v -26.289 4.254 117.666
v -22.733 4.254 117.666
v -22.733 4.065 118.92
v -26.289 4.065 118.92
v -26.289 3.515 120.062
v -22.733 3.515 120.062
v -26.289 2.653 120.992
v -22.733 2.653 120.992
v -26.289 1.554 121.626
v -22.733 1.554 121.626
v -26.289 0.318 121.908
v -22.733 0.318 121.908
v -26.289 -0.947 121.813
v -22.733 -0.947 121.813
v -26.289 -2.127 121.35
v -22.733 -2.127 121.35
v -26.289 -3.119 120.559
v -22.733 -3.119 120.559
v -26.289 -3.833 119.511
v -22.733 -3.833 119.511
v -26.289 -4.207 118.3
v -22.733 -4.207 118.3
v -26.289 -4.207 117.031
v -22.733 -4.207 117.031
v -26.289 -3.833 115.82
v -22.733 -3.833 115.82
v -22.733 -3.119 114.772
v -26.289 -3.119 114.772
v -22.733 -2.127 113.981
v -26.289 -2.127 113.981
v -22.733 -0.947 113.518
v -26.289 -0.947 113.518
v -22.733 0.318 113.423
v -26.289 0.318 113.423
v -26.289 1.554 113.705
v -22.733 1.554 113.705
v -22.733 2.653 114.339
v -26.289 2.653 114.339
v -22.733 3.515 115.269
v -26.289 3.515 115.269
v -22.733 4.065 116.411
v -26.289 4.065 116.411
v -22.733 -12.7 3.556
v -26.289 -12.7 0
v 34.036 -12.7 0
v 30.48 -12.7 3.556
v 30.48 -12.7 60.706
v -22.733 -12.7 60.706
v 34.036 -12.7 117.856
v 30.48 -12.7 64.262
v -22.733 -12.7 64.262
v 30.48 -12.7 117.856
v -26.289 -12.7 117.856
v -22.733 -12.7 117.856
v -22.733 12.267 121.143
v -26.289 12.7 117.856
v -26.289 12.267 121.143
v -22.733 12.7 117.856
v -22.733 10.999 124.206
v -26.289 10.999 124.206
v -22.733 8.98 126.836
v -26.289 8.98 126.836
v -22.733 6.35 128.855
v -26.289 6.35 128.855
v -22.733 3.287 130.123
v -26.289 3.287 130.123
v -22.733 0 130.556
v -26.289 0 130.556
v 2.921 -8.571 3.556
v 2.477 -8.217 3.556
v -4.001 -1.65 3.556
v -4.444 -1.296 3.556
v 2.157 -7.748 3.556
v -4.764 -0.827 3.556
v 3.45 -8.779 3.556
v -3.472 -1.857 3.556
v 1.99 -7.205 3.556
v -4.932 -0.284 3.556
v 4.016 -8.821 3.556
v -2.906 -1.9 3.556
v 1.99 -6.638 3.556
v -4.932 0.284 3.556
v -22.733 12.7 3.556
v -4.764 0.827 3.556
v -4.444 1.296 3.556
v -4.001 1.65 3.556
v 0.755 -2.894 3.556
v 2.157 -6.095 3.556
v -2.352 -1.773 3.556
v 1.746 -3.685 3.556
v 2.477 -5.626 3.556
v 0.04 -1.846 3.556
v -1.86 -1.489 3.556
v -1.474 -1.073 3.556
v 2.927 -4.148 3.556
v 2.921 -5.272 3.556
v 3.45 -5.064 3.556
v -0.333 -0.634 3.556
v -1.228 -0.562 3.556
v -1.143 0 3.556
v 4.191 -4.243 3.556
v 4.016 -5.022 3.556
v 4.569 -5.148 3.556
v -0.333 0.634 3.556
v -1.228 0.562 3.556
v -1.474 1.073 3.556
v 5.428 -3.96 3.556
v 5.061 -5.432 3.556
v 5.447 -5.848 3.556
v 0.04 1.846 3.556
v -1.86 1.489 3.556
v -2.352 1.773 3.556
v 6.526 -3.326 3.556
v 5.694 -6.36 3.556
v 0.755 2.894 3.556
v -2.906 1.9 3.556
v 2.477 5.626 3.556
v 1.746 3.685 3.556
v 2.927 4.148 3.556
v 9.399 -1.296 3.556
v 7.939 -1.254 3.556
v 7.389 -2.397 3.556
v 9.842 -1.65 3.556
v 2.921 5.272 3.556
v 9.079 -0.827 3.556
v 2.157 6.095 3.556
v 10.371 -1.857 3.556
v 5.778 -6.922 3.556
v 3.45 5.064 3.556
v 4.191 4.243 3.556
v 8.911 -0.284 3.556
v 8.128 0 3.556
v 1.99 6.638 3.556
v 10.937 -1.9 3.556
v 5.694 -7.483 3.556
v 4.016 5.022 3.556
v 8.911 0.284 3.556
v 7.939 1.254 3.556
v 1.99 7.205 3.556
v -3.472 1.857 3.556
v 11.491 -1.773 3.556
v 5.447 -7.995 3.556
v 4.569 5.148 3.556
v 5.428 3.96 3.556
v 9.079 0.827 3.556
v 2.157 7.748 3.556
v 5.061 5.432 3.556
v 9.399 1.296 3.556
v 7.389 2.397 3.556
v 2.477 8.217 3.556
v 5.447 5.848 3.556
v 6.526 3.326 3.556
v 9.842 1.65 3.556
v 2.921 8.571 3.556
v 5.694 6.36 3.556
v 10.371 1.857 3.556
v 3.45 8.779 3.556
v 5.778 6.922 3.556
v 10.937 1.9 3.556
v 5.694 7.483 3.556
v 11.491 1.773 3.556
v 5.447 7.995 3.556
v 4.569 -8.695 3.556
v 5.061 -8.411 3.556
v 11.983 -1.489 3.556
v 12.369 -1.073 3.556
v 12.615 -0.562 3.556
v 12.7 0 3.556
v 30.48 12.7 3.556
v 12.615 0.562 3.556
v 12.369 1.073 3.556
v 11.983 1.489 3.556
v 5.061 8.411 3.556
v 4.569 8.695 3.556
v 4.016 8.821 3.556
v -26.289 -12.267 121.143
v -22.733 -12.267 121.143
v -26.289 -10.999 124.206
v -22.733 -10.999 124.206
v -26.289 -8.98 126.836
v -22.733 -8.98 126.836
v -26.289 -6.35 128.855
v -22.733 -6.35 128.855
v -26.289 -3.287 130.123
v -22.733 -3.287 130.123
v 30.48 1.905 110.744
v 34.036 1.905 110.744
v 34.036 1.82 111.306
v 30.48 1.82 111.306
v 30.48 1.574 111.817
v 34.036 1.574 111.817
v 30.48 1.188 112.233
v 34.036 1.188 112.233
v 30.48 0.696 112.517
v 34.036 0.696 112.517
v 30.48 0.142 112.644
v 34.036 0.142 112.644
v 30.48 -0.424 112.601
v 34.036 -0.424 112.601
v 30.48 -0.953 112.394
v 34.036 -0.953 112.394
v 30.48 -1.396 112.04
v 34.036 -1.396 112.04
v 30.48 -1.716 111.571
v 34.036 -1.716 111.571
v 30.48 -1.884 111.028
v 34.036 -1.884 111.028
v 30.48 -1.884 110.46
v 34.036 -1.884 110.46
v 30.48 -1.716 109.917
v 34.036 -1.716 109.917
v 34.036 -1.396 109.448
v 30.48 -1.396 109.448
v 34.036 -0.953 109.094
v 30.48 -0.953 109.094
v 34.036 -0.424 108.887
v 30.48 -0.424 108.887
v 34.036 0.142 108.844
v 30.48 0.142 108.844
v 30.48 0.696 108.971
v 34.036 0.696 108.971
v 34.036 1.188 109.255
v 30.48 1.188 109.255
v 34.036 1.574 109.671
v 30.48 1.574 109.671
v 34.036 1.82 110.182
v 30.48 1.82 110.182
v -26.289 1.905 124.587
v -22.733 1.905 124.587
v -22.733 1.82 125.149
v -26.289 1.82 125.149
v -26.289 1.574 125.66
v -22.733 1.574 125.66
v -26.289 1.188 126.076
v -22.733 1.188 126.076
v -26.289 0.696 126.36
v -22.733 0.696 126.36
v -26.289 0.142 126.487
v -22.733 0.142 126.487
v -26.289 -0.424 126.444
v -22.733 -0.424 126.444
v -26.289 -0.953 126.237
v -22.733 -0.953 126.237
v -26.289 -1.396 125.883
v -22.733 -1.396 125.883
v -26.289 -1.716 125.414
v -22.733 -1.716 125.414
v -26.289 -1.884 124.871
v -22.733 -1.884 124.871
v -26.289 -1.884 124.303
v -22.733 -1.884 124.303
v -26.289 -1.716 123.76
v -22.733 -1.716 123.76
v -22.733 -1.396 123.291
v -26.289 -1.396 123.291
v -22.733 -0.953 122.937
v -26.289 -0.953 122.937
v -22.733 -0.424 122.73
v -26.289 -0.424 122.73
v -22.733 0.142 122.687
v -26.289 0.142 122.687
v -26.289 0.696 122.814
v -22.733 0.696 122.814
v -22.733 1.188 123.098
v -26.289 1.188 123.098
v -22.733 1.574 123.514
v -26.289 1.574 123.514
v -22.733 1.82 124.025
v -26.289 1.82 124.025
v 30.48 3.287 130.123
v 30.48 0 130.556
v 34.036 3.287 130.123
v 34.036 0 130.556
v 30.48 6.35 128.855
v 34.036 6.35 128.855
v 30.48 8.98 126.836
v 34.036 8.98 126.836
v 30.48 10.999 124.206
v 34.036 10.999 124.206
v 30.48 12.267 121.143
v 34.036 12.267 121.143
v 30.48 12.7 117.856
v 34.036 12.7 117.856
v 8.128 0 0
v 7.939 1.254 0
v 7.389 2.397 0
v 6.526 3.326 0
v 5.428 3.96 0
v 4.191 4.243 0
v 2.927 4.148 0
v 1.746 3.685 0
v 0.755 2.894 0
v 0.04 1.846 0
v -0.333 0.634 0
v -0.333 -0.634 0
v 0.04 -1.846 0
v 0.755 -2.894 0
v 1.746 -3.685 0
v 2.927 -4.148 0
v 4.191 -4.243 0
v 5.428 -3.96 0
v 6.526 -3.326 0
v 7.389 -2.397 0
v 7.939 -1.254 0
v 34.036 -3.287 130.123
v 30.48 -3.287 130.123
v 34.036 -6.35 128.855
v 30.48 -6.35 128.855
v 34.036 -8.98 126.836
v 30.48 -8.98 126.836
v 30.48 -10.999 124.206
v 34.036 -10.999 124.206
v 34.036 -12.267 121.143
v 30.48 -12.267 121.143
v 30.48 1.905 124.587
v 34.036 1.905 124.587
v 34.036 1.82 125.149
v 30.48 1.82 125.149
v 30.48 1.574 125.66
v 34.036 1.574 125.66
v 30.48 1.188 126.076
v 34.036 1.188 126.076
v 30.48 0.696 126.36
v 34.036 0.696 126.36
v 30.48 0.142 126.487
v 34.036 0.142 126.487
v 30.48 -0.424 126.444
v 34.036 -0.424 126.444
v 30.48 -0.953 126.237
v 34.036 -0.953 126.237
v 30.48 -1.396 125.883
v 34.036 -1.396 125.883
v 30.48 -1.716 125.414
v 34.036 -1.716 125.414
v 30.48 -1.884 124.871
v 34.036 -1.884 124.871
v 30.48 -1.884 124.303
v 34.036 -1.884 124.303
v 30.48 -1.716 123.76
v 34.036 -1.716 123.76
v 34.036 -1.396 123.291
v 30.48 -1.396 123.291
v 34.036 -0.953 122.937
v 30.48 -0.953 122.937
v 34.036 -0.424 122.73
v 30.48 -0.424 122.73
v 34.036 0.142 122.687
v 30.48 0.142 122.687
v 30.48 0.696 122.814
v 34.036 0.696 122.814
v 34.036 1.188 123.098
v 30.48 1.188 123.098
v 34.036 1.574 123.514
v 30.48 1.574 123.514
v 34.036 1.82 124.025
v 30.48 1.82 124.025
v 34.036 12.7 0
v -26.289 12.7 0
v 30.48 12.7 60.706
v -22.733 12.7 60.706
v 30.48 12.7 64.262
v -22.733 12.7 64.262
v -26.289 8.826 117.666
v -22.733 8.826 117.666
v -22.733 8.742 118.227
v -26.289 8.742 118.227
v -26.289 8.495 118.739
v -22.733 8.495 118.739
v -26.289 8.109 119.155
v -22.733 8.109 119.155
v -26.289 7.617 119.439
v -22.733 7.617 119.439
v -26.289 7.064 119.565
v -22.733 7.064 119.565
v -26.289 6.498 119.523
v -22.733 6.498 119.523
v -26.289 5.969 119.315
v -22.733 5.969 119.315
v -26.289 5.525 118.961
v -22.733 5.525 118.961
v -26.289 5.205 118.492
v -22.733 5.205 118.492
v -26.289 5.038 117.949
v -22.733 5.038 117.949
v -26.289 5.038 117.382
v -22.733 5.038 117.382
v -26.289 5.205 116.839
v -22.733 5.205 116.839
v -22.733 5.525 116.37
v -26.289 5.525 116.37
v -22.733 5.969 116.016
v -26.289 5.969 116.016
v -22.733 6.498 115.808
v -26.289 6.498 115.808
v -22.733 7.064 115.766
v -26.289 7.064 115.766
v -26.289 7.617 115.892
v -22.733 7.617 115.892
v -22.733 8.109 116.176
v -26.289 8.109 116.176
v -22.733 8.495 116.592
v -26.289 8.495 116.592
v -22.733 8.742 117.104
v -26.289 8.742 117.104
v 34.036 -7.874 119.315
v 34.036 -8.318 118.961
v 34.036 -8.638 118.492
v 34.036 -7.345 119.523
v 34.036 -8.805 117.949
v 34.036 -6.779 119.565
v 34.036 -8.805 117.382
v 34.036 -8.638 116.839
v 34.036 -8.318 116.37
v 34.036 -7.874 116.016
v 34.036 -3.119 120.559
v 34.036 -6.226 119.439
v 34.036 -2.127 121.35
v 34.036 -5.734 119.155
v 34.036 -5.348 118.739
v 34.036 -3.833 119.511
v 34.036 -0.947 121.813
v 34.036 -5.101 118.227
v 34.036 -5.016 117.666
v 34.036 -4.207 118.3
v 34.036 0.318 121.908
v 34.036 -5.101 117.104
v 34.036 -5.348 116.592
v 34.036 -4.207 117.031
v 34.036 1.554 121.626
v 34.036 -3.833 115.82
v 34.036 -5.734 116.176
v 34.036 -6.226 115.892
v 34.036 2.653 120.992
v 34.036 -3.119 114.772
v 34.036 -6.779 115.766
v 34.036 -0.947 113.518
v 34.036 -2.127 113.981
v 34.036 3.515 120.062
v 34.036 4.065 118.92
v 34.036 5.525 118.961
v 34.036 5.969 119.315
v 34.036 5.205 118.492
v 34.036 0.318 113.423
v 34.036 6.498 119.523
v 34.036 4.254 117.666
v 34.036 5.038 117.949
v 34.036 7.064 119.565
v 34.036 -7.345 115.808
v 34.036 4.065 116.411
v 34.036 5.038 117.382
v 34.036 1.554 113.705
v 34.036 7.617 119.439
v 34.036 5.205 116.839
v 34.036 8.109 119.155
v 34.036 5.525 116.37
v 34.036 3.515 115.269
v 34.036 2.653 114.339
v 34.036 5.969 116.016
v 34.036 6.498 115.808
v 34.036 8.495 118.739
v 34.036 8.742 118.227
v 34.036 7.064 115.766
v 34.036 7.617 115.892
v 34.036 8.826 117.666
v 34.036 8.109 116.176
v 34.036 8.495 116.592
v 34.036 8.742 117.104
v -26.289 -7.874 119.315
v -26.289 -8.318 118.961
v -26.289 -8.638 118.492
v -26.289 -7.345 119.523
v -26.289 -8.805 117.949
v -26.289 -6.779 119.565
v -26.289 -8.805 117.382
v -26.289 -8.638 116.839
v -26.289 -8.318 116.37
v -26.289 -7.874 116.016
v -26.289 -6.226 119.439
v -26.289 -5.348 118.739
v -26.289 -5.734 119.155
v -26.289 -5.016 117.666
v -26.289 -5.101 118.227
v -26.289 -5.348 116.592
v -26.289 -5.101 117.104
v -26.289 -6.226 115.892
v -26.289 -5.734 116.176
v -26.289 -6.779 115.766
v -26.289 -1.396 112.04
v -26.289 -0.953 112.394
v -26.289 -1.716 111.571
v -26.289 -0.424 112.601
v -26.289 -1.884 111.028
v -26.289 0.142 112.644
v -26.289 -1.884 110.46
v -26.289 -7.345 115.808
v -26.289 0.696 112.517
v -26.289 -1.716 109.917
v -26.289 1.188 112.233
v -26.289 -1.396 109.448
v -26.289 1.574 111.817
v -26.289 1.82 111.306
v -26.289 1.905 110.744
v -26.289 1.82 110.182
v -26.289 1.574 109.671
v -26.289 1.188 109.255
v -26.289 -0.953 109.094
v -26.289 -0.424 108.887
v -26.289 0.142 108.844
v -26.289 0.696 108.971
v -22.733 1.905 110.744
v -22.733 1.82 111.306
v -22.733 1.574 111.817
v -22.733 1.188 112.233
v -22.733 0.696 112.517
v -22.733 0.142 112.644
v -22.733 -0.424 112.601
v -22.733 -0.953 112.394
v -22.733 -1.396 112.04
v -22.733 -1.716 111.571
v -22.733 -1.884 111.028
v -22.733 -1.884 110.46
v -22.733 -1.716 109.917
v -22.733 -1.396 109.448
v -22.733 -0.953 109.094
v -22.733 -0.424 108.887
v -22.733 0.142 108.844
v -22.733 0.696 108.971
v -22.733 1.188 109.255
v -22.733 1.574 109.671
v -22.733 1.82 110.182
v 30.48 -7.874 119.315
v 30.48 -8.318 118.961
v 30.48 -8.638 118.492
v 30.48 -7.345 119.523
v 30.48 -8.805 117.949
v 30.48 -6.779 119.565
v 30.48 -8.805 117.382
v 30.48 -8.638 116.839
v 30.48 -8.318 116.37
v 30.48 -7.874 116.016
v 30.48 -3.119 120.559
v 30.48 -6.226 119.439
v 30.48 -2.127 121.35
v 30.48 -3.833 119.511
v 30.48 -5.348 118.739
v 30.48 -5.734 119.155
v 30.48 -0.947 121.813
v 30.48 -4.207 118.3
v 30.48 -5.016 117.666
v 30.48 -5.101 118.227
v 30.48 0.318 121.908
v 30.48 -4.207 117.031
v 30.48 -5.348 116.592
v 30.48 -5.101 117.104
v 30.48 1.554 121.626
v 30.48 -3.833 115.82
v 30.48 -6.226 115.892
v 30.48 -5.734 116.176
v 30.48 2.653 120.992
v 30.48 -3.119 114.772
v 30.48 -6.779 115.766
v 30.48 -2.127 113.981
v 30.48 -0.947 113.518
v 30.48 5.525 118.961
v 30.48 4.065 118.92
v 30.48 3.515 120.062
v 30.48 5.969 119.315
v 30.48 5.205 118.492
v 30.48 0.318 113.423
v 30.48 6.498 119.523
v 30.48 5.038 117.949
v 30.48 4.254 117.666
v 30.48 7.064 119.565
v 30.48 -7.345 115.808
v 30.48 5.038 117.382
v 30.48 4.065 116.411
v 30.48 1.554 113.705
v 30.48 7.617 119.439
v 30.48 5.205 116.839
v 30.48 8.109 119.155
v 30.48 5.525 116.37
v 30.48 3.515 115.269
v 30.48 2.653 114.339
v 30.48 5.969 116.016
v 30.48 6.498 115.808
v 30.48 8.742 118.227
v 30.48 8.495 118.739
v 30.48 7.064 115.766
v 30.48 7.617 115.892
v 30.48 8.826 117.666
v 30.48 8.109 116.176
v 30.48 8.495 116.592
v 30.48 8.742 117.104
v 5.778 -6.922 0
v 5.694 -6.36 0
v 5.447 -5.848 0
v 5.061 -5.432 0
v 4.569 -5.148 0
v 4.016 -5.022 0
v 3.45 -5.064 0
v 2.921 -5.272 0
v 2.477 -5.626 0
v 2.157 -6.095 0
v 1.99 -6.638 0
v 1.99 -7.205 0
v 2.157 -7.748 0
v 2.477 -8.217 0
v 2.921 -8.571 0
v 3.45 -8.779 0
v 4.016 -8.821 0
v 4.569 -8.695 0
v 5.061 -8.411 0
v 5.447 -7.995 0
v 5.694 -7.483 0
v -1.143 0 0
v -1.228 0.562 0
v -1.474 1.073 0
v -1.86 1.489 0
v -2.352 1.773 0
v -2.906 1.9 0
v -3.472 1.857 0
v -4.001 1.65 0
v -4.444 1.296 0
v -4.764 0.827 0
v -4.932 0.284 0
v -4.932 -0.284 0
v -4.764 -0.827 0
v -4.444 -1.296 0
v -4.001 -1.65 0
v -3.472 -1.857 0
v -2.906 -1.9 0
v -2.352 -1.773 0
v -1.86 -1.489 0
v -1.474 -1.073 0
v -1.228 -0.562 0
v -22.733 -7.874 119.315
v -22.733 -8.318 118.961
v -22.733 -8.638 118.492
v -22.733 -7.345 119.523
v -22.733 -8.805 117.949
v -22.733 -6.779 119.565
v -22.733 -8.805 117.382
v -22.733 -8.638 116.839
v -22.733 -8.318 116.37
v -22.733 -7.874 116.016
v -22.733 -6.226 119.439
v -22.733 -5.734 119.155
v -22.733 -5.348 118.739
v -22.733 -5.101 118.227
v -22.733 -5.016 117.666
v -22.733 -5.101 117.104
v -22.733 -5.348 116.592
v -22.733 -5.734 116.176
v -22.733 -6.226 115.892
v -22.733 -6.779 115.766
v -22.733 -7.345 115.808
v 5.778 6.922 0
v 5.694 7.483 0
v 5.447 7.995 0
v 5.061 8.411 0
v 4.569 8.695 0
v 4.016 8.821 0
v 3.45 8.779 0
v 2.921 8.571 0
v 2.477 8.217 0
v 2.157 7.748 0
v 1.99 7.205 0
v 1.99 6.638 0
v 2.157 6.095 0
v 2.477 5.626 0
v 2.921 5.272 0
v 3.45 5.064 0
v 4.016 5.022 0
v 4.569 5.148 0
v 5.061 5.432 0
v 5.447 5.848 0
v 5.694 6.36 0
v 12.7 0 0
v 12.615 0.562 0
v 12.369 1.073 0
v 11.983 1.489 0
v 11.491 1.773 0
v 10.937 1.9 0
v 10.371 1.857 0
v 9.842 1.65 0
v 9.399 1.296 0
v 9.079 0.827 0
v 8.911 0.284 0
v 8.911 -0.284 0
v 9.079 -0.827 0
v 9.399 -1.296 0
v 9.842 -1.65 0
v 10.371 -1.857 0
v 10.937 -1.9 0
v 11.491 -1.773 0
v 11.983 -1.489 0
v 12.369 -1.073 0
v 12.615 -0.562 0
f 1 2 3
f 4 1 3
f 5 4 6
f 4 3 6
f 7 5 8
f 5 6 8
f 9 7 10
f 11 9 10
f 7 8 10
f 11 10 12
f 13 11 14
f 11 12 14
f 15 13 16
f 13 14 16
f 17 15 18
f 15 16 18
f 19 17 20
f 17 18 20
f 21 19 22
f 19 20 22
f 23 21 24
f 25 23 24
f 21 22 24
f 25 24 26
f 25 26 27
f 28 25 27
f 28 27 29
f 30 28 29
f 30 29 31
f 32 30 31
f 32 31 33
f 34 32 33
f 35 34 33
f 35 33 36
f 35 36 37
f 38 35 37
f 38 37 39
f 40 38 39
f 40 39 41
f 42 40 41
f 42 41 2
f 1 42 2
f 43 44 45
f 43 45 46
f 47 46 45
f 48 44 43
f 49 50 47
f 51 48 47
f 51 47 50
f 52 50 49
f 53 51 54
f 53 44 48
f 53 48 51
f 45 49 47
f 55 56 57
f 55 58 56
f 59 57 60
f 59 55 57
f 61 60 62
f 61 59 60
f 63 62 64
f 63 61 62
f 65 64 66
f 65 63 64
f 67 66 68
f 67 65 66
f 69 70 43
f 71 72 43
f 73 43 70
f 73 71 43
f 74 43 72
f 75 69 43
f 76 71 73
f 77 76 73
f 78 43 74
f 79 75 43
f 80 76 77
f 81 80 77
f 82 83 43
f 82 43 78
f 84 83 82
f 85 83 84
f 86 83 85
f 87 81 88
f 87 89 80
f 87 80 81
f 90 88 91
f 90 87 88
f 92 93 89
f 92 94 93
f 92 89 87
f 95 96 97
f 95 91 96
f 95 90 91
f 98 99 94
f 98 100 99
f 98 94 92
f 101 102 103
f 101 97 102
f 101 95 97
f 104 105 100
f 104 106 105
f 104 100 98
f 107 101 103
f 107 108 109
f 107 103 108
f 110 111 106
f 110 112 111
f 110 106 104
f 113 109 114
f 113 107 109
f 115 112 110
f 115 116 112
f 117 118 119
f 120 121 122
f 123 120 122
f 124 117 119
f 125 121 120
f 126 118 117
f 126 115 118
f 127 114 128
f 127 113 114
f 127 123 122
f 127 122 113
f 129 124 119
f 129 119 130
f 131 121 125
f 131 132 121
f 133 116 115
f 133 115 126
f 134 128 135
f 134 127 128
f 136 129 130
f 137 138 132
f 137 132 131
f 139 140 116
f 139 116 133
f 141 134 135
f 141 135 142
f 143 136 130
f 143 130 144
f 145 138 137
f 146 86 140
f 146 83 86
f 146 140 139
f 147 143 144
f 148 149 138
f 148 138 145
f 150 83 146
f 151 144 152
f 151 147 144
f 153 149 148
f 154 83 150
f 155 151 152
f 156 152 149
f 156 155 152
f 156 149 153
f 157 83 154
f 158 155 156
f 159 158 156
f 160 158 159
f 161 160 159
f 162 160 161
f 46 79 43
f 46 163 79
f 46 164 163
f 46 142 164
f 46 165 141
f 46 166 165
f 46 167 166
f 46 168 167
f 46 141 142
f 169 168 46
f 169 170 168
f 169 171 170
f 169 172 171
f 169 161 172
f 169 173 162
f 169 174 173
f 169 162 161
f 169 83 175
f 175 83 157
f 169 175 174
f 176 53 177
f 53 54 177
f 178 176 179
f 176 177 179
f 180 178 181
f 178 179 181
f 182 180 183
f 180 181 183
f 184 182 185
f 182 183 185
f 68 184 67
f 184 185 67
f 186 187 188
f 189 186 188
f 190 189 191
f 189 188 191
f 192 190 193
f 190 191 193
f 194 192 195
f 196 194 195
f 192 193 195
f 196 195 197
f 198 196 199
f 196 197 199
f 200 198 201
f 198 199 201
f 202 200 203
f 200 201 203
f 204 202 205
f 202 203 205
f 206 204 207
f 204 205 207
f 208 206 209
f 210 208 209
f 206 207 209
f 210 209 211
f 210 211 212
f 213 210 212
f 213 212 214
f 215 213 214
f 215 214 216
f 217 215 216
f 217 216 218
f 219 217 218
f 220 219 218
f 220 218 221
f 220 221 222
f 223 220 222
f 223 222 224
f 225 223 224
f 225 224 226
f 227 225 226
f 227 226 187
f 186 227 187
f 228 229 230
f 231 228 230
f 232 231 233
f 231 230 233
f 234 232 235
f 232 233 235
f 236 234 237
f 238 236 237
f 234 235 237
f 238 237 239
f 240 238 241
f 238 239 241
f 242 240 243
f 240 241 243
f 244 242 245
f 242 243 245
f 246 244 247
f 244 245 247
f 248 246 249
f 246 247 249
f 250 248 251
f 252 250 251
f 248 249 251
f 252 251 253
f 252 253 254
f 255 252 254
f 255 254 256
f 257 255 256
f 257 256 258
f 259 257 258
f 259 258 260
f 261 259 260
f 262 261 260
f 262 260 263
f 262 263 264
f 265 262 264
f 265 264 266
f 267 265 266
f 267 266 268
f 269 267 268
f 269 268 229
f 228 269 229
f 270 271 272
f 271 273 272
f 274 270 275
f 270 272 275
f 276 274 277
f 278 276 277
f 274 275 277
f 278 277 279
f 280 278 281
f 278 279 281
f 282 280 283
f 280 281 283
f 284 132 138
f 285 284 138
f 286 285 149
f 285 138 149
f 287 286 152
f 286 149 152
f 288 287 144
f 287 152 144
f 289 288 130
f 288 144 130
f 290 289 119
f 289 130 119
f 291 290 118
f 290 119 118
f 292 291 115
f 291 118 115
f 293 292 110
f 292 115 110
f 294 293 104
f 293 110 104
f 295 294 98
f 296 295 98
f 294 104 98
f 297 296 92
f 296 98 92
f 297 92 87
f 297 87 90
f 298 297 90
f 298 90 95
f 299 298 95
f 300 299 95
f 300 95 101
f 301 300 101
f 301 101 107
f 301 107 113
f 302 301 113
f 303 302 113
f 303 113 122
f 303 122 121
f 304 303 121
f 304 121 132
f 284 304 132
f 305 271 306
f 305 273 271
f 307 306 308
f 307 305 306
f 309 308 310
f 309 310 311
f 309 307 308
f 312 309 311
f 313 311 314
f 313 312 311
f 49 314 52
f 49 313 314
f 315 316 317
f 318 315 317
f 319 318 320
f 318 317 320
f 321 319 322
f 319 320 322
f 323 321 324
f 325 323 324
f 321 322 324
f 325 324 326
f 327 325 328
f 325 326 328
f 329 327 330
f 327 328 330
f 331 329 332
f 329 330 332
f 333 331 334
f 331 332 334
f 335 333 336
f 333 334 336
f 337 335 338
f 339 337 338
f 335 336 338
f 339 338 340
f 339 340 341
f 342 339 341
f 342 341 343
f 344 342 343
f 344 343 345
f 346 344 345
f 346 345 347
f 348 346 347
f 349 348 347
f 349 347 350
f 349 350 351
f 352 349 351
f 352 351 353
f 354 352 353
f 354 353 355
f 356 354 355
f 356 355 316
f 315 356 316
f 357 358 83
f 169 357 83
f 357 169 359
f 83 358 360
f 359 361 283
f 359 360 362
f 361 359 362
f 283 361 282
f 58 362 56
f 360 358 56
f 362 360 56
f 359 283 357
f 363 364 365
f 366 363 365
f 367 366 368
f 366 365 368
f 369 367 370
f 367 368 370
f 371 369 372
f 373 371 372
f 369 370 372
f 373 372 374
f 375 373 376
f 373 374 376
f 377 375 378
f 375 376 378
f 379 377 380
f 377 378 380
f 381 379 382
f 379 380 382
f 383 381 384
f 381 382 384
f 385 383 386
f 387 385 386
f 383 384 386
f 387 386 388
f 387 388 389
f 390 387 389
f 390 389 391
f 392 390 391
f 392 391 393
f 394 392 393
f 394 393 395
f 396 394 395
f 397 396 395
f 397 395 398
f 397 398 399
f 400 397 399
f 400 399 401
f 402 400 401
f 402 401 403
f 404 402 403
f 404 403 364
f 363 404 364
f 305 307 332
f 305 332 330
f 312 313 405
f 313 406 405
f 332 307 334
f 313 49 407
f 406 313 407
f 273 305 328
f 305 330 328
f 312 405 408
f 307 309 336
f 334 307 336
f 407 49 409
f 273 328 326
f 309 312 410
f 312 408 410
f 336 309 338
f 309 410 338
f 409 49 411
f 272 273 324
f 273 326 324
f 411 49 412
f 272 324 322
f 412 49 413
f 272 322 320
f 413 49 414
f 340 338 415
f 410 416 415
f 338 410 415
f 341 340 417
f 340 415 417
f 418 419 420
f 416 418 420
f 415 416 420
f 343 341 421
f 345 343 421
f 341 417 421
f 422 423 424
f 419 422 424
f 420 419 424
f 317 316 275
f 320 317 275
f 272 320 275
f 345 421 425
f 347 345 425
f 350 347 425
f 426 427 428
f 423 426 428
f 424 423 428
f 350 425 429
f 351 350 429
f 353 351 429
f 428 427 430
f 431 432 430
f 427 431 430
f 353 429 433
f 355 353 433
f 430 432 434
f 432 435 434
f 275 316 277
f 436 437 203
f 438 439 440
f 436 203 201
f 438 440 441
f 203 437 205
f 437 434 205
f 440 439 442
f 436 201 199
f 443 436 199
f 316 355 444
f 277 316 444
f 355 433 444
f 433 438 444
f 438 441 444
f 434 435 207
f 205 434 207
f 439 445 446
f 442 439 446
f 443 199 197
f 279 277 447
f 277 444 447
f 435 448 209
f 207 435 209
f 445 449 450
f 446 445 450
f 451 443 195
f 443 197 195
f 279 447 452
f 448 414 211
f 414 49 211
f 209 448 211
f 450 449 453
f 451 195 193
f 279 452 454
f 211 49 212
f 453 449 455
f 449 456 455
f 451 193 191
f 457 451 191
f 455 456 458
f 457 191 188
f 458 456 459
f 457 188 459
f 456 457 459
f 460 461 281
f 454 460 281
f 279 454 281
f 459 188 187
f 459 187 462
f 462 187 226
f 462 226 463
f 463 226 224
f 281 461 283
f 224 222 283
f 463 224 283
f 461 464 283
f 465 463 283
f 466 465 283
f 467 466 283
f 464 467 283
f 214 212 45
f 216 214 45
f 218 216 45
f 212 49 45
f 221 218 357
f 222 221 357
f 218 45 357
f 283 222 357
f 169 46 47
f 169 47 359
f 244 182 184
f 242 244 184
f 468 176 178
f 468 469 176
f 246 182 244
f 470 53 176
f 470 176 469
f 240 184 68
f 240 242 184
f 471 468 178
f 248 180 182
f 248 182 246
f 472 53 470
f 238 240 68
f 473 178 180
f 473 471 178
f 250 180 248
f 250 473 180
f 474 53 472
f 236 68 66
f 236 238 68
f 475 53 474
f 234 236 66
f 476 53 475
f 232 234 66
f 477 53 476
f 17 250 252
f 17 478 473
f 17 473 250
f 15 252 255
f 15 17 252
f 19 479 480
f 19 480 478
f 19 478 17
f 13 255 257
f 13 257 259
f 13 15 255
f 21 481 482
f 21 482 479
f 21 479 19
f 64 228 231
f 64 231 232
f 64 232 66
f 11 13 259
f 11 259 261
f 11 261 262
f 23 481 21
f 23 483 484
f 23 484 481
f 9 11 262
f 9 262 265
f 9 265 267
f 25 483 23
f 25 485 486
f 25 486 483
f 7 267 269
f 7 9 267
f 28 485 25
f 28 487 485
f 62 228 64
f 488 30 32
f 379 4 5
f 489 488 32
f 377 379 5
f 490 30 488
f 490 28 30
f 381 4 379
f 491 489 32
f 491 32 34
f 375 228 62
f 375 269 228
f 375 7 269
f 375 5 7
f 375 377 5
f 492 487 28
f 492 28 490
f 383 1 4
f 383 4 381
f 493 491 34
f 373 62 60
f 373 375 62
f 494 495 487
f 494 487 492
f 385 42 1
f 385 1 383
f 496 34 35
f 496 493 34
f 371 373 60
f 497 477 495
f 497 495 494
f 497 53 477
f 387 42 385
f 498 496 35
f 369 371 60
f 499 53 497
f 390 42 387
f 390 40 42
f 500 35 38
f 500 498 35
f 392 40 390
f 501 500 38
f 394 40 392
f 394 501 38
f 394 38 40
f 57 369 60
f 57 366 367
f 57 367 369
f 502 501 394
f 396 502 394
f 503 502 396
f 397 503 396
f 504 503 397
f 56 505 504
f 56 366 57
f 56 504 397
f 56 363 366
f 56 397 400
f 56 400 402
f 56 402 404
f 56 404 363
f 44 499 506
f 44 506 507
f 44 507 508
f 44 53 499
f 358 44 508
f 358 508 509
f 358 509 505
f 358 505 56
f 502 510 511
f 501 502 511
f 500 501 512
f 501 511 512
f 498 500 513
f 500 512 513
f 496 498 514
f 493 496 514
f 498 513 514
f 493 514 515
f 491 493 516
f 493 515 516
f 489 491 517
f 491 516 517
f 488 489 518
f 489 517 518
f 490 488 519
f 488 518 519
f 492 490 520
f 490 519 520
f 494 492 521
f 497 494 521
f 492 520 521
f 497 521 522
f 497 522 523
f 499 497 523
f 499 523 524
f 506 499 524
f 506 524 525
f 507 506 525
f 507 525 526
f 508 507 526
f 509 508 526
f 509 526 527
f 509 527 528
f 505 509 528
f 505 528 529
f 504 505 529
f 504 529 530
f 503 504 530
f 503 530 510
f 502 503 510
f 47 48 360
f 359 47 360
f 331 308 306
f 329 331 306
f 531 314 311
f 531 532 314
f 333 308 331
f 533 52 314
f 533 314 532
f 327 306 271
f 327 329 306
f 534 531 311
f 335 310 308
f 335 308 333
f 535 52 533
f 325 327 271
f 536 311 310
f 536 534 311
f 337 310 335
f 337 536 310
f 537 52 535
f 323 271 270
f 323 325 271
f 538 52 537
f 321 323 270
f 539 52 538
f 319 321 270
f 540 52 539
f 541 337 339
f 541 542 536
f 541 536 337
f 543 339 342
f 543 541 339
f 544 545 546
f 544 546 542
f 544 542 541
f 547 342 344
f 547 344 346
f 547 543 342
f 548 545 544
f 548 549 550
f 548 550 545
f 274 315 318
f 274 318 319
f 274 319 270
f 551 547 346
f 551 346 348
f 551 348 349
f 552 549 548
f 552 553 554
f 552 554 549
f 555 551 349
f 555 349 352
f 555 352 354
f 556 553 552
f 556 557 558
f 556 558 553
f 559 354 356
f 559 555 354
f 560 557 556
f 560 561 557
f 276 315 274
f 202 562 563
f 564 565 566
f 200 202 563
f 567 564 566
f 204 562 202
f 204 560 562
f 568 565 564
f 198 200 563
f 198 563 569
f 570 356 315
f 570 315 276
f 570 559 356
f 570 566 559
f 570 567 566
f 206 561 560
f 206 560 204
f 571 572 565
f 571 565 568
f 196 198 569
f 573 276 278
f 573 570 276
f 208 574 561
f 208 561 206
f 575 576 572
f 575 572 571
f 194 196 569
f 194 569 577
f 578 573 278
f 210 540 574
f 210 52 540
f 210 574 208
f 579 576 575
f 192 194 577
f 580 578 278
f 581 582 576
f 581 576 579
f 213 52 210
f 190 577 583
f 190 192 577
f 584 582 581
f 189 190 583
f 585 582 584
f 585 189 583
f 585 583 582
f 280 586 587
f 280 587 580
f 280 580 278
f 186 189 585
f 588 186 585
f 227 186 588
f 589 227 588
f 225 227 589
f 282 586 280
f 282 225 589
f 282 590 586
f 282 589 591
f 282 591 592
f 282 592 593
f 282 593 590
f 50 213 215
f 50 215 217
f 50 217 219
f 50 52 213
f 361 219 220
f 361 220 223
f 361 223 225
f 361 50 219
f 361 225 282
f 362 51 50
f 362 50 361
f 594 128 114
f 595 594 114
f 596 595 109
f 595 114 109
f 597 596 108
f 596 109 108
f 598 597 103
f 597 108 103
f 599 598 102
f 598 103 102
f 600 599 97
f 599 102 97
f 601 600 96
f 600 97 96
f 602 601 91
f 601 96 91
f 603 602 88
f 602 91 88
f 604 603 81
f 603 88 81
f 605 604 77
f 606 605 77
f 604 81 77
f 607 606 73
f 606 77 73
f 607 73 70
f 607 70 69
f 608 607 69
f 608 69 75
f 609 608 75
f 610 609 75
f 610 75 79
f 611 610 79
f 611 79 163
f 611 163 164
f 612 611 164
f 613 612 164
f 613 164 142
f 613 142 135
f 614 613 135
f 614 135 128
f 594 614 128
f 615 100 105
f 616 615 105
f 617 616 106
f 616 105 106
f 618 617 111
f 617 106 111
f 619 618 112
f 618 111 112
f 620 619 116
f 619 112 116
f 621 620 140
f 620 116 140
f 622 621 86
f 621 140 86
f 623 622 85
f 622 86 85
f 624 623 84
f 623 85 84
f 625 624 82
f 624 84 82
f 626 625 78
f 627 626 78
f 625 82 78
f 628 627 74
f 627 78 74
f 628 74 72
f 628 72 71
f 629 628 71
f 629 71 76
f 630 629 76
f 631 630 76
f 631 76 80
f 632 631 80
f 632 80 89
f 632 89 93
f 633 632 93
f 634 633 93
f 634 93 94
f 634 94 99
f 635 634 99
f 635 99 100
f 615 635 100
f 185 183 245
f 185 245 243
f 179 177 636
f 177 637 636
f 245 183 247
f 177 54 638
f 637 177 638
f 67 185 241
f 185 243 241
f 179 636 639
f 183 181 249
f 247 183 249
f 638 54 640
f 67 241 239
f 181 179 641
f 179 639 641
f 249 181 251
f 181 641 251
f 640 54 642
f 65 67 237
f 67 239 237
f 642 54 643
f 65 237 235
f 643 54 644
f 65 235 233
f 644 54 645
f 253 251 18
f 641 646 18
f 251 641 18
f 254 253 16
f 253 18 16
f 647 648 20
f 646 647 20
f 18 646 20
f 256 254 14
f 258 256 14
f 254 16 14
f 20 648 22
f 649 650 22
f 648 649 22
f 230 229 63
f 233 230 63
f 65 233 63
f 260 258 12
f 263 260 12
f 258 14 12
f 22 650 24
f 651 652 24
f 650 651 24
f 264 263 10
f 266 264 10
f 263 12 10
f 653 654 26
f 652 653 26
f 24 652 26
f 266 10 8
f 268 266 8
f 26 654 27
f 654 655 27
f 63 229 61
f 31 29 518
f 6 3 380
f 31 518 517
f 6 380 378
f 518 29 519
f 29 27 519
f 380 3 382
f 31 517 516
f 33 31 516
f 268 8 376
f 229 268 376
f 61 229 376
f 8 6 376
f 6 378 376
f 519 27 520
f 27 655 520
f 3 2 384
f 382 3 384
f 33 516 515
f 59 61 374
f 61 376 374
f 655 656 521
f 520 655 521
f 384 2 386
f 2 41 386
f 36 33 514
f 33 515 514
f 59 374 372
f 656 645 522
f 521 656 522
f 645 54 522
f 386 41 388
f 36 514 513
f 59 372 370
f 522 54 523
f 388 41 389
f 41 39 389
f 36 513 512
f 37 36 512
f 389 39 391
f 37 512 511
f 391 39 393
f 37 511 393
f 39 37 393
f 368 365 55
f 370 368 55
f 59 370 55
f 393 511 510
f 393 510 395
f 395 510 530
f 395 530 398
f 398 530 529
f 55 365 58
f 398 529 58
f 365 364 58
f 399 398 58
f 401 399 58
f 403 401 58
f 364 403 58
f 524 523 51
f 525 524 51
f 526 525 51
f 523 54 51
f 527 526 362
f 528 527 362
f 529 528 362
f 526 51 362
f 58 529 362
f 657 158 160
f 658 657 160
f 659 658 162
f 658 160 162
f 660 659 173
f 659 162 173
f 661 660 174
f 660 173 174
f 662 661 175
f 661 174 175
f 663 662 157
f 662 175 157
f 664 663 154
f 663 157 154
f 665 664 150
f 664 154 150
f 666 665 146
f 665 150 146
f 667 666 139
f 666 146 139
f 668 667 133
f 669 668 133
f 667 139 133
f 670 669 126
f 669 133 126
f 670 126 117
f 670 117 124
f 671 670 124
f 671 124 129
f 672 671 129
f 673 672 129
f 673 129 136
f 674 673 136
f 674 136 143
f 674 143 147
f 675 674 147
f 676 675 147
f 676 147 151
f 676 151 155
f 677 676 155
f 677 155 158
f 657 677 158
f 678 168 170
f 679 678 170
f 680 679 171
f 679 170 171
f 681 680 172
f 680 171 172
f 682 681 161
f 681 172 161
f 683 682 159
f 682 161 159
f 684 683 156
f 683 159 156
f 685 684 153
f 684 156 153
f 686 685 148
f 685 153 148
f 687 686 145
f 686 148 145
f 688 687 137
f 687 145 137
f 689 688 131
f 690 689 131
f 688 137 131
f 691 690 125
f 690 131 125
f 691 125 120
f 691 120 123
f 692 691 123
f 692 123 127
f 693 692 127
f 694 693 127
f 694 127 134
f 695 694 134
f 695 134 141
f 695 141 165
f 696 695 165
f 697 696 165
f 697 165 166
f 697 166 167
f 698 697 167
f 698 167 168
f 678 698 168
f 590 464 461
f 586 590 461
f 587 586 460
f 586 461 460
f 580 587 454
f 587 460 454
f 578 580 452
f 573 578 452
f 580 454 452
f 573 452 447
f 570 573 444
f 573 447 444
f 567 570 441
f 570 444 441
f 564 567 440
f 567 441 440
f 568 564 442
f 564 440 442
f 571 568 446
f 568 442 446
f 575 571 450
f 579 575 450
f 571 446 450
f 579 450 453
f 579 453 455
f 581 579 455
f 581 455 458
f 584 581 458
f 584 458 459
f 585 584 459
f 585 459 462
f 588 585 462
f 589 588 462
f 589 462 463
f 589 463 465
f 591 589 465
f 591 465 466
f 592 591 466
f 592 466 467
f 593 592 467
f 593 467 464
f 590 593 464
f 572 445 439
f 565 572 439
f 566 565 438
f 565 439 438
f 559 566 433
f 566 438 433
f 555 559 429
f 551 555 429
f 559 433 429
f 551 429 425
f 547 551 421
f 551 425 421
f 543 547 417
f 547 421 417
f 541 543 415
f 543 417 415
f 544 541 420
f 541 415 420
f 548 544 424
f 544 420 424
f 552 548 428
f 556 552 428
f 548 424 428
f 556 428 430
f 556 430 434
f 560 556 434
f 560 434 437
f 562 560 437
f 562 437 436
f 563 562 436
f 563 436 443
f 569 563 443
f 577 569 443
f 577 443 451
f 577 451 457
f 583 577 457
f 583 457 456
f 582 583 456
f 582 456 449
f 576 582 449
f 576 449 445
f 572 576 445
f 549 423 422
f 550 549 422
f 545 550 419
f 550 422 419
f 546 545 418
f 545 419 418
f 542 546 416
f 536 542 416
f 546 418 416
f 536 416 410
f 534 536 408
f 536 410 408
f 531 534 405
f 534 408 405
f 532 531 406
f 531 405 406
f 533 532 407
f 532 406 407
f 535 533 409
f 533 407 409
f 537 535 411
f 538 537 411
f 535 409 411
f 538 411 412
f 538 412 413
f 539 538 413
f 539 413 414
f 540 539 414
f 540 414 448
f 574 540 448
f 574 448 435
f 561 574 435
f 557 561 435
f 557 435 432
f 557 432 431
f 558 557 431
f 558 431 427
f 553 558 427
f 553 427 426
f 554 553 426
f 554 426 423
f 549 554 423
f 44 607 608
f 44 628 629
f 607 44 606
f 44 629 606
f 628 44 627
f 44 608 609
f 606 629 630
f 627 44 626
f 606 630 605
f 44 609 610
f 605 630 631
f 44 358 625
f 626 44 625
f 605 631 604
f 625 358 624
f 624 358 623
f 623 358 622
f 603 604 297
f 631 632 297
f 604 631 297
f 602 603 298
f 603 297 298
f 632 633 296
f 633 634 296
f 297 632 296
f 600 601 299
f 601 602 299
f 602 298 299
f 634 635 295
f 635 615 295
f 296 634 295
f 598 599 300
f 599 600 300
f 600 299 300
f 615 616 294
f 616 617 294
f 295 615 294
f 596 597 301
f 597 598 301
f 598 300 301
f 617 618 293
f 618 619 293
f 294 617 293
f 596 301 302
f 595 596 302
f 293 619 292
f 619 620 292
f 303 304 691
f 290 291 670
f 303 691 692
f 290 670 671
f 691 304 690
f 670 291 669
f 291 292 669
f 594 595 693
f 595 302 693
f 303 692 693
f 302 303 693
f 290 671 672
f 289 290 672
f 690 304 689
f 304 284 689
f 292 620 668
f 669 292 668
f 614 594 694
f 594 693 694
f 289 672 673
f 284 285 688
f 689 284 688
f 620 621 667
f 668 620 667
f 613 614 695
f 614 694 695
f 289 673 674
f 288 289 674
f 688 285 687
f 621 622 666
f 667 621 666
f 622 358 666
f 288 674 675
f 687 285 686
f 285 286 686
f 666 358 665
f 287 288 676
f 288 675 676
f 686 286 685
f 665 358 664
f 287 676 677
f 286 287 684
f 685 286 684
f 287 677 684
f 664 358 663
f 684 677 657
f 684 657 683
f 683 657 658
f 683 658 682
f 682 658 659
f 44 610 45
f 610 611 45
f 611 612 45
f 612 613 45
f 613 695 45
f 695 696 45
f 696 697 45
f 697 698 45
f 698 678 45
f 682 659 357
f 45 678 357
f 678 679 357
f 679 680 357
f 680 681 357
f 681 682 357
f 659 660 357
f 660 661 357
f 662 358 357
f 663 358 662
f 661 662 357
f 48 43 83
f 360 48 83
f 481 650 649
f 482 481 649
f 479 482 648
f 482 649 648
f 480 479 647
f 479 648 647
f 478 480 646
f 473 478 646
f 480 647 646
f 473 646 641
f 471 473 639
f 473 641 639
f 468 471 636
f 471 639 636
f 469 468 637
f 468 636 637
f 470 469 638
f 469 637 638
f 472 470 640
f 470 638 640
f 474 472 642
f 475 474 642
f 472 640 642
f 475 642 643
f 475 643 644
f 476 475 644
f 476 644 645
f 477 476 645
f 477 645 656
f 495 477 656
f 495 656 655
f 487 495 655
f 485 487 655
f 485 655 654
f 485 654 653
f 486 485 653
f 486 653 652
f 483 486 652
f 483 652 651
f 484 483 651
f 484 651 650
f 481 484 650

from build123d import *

# Parameters (mm, degrees)
F0_W      = 60.325
F0_H      = 25.4
F1_DEPTH  = 3.556
F2_W      = 3.556
F2_H      = 25.4
F3_DEPTH  = 127
F4_R      = 12.7
F5_R      = 12.69999
F6_R      = 4.2545
F6_R_2    = 1.905
F7_DEPTH  = 254
F8_R      = 4.2545
F8_R_2    = 1.905
F9_DEPTH  = 25.4
F10_W     = 25.4
F10_H     = 3.556
F11_DEPTH = 53.34


# Not quite as in the source:
# - a fillet or chamfer is up to 0.001 mm smaller than in the source, because OpenCascade refuses the exact size


with BuildPart() as f1:
    # F0 (on Top) → F1 (new body)
    with BuildSketch(Plane.XY):
        with Locations((3.8735, 0)):
            Rectangle(F0_W, F0_H)
    extrude(amount=F1_DEPTH)

    # F2 (on face) → F3 (join)
    with BuildSketch(Plane.XY.offset(3.556)):
        with Locations((-24.511, 0)):
            Rectangle(F2_W, F2_H)
        with Locations((32.258, 0)):
            Rectangle(F2_W, F2_H)
    extrude(amount=F3_DEPTH)

    # F4
    f4_edges = [f1.edges().sort_by_distance(p)[0] for p in [
        (32.258, 12.7, 130.556),
    ]]
    fillet(f4_edges, radius=F4_R)

    # F5 (radius 12.7 in the source; OpenCascade refuses exactly that, so slightly less here)
    f5_edges = [f1.edges().sort_by_distance(p)[0] for p in [
        (32.258, -12.7, 130.556),
        (-24.511, -12.7, 130.556),
        (-24.511, 12.7, 130.556),
    ]]
    fillet(f5_edges, radius=F5_R)

    # F6 (on face) → F7 (cut)
    with BuildSketch(Plane.YZ.offset(34.036)):
        with Locations((0, 117.6655)):
            Circle(F6_R)
        with Locations((0, 124.587)):
            Circle(F6_R_2)
        with Locations((-6.9215, 117.6655)):
            Circle(F6_R_2)
        with Locations((0, 110.744)):
            Circle(F6_R_2)
        with Locations((6.9215, 117.6655)):
            Circle(F6_R_2)
    extrude(amount=-F7_DEPTH, mode=Mode.SUBTRACT)

    # F8 (on face) → F9 (cut)
    with BuildSketch(Plane.XY.offset(3.556)):
        with Locations((3.8735, 0)):
            Circle(F8_R)
        with Locations((-3.048, 0)):
            Circle(F8_R_2)
        with Locations((3.8735, 6.9215)):
            Circle(F8_R_2)
        with Locations((3.8735, -6.9215)):
            Circle(F8_R_2)
        with Locations((10.795, 0)):
            Circle(F8_R_2)
    extrude(amount=-F9_DEPTH, mode=Mode.SUBTRACT)

    # F10 (on face) → F11 (join)
    with BuildSketch(Plane.YZ.offset(-22.733)):
        with Locations((0, 62.484)):
            Rectangle(F10_W, F10_H)
    extrude(amount=F11_DEPTH)


solid = f1.part
